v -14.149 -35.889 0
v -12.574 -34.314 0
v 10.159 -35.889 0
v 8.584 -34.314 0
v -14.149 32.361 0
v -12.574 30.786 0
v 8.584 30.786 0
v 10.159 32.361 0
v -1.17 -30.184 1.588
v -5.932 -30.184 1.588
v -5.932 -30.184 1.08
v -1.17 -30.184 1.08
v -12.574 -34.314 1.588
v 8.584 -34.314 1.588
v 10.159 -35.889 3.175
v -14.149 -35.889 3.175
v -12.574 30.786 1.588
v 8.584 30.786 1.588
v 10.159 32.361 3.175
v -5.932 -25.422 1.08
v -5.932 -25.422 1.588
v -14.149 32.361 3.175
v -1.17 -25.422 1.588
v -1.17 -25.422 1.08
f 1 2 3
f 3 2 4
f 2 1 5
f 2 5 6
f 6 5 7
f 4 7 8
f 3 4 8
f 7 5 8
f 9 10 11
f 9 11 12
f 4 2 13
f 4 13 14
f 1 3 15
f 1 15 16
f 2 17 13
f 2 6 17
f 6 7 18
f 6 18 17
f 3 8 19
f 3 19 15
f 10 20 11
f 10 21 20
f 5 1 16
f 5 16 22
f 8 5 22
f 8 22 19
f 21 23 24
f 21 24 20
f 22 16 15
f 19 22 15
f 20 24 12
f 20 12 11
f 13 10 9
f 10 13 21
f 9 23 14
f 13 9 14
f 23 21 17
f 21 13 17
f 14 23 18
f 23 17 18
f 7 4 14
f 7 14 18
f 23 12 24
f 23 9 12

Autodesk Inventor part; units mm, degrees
ref_plane "YZ Plane" through (0, 0, 0) normal (1, 0, 0) x (0, 1, 0)
ref_plane "XZ Plane" through (0, 0, 0) normal (0, 1, 0) x (-1, 0, 0)
ref_plane "XY Plane" through (0, 0, 0) normal (0, 0, 1) x (1, 0, 0)
sketch "Sketch1" plane through (0, 0, 0) normal (0, 0, 1) x (1, 0, 0)
  line L0 (-13.3613, 31.5734) -> (9.3717, 31.5734)
  line L1 (9.3717, 31.5734) -> (9.3717, -35.1016)
  line L2 (9.3717, -35.1016) -> (-13.3613, -35.1016)
  line L3 (-13.3613, -35.1016) -> (-13.3613, 31.5734)
  line L4 (10.1591, 32.3608) -> (-14.1487, 32.3608)
  line L5 (-14.1487, 32.3608) -> (-14.1487, -35.889)
  line L6 (-14.1487, -35.889) -> (10.1591, -35.889)
  line L7 (10.1591, -35.889) -> (10.1591, 32.3608)
  line L8 (8.5843, 30.786) -> (-12.5739, 30.786)
  line L9 (-12.5739, 30.786) -> (-12.5739, -34.3142)
  line L10 (-12.5739, -34.3142) -> (8.5843, -34.3142)
  line L11 (8.5843, -34.3142) -> (8.5843, 30.786)
  point P0 (0, 0)
  dimension "d0" = 22.733
  dimension "d1" = 66.675
  dimension "d2" = 0.7874
  dimension "d3" = 0.7874
extrude "Extrusion1" add sketch "Sketch1" along normal blind 1.5875 contours L0 L1 L2 L3 | L7 L6 L5 L4
sketch "Sketch3" plane through (0, 0, 1.5875) normal (0, 0, 1) x (1, 0, 0)
  line L0 (-14.1487, 32.3608) -> (10.1591, 32.3608)
  line L1 (10.1591, 32.3608) -> (10.1591, -35.889)
  line L2 (10.1591, -35.889) -> (-14.1487, -35.889)
  line L3 (-14.1487, -35.889) -> (-14.1487, 32.3608)
  point P0 (0, 0)
extrude "Extrusion2" add sketch "Sketch3" along normal blind 1.5875
sketch "Sketch4" plane through (0, 0, 1.5875) normal (0, 0, -1) x (-1, 0, 0)
  line L0 (1.1699, -25.422) -> (5.9324, -25.422)
  line L1 (5.9324, -25.422) -> (5.9324, -30.1845)
  line L2 (5.9324, -30.1845) -> (1.1699, -30.1845)
  line L3 (1.1699, -30.1845) -> (1.1699, -25.422)
  point P0 (0, 0)
  dimension "d10" = 4.7625
  dimension "d11" = 4.7625
extrude "Extrusion3" add sketch "Sketch4" along normal blind 0.508
properties part number "YagiCan"
